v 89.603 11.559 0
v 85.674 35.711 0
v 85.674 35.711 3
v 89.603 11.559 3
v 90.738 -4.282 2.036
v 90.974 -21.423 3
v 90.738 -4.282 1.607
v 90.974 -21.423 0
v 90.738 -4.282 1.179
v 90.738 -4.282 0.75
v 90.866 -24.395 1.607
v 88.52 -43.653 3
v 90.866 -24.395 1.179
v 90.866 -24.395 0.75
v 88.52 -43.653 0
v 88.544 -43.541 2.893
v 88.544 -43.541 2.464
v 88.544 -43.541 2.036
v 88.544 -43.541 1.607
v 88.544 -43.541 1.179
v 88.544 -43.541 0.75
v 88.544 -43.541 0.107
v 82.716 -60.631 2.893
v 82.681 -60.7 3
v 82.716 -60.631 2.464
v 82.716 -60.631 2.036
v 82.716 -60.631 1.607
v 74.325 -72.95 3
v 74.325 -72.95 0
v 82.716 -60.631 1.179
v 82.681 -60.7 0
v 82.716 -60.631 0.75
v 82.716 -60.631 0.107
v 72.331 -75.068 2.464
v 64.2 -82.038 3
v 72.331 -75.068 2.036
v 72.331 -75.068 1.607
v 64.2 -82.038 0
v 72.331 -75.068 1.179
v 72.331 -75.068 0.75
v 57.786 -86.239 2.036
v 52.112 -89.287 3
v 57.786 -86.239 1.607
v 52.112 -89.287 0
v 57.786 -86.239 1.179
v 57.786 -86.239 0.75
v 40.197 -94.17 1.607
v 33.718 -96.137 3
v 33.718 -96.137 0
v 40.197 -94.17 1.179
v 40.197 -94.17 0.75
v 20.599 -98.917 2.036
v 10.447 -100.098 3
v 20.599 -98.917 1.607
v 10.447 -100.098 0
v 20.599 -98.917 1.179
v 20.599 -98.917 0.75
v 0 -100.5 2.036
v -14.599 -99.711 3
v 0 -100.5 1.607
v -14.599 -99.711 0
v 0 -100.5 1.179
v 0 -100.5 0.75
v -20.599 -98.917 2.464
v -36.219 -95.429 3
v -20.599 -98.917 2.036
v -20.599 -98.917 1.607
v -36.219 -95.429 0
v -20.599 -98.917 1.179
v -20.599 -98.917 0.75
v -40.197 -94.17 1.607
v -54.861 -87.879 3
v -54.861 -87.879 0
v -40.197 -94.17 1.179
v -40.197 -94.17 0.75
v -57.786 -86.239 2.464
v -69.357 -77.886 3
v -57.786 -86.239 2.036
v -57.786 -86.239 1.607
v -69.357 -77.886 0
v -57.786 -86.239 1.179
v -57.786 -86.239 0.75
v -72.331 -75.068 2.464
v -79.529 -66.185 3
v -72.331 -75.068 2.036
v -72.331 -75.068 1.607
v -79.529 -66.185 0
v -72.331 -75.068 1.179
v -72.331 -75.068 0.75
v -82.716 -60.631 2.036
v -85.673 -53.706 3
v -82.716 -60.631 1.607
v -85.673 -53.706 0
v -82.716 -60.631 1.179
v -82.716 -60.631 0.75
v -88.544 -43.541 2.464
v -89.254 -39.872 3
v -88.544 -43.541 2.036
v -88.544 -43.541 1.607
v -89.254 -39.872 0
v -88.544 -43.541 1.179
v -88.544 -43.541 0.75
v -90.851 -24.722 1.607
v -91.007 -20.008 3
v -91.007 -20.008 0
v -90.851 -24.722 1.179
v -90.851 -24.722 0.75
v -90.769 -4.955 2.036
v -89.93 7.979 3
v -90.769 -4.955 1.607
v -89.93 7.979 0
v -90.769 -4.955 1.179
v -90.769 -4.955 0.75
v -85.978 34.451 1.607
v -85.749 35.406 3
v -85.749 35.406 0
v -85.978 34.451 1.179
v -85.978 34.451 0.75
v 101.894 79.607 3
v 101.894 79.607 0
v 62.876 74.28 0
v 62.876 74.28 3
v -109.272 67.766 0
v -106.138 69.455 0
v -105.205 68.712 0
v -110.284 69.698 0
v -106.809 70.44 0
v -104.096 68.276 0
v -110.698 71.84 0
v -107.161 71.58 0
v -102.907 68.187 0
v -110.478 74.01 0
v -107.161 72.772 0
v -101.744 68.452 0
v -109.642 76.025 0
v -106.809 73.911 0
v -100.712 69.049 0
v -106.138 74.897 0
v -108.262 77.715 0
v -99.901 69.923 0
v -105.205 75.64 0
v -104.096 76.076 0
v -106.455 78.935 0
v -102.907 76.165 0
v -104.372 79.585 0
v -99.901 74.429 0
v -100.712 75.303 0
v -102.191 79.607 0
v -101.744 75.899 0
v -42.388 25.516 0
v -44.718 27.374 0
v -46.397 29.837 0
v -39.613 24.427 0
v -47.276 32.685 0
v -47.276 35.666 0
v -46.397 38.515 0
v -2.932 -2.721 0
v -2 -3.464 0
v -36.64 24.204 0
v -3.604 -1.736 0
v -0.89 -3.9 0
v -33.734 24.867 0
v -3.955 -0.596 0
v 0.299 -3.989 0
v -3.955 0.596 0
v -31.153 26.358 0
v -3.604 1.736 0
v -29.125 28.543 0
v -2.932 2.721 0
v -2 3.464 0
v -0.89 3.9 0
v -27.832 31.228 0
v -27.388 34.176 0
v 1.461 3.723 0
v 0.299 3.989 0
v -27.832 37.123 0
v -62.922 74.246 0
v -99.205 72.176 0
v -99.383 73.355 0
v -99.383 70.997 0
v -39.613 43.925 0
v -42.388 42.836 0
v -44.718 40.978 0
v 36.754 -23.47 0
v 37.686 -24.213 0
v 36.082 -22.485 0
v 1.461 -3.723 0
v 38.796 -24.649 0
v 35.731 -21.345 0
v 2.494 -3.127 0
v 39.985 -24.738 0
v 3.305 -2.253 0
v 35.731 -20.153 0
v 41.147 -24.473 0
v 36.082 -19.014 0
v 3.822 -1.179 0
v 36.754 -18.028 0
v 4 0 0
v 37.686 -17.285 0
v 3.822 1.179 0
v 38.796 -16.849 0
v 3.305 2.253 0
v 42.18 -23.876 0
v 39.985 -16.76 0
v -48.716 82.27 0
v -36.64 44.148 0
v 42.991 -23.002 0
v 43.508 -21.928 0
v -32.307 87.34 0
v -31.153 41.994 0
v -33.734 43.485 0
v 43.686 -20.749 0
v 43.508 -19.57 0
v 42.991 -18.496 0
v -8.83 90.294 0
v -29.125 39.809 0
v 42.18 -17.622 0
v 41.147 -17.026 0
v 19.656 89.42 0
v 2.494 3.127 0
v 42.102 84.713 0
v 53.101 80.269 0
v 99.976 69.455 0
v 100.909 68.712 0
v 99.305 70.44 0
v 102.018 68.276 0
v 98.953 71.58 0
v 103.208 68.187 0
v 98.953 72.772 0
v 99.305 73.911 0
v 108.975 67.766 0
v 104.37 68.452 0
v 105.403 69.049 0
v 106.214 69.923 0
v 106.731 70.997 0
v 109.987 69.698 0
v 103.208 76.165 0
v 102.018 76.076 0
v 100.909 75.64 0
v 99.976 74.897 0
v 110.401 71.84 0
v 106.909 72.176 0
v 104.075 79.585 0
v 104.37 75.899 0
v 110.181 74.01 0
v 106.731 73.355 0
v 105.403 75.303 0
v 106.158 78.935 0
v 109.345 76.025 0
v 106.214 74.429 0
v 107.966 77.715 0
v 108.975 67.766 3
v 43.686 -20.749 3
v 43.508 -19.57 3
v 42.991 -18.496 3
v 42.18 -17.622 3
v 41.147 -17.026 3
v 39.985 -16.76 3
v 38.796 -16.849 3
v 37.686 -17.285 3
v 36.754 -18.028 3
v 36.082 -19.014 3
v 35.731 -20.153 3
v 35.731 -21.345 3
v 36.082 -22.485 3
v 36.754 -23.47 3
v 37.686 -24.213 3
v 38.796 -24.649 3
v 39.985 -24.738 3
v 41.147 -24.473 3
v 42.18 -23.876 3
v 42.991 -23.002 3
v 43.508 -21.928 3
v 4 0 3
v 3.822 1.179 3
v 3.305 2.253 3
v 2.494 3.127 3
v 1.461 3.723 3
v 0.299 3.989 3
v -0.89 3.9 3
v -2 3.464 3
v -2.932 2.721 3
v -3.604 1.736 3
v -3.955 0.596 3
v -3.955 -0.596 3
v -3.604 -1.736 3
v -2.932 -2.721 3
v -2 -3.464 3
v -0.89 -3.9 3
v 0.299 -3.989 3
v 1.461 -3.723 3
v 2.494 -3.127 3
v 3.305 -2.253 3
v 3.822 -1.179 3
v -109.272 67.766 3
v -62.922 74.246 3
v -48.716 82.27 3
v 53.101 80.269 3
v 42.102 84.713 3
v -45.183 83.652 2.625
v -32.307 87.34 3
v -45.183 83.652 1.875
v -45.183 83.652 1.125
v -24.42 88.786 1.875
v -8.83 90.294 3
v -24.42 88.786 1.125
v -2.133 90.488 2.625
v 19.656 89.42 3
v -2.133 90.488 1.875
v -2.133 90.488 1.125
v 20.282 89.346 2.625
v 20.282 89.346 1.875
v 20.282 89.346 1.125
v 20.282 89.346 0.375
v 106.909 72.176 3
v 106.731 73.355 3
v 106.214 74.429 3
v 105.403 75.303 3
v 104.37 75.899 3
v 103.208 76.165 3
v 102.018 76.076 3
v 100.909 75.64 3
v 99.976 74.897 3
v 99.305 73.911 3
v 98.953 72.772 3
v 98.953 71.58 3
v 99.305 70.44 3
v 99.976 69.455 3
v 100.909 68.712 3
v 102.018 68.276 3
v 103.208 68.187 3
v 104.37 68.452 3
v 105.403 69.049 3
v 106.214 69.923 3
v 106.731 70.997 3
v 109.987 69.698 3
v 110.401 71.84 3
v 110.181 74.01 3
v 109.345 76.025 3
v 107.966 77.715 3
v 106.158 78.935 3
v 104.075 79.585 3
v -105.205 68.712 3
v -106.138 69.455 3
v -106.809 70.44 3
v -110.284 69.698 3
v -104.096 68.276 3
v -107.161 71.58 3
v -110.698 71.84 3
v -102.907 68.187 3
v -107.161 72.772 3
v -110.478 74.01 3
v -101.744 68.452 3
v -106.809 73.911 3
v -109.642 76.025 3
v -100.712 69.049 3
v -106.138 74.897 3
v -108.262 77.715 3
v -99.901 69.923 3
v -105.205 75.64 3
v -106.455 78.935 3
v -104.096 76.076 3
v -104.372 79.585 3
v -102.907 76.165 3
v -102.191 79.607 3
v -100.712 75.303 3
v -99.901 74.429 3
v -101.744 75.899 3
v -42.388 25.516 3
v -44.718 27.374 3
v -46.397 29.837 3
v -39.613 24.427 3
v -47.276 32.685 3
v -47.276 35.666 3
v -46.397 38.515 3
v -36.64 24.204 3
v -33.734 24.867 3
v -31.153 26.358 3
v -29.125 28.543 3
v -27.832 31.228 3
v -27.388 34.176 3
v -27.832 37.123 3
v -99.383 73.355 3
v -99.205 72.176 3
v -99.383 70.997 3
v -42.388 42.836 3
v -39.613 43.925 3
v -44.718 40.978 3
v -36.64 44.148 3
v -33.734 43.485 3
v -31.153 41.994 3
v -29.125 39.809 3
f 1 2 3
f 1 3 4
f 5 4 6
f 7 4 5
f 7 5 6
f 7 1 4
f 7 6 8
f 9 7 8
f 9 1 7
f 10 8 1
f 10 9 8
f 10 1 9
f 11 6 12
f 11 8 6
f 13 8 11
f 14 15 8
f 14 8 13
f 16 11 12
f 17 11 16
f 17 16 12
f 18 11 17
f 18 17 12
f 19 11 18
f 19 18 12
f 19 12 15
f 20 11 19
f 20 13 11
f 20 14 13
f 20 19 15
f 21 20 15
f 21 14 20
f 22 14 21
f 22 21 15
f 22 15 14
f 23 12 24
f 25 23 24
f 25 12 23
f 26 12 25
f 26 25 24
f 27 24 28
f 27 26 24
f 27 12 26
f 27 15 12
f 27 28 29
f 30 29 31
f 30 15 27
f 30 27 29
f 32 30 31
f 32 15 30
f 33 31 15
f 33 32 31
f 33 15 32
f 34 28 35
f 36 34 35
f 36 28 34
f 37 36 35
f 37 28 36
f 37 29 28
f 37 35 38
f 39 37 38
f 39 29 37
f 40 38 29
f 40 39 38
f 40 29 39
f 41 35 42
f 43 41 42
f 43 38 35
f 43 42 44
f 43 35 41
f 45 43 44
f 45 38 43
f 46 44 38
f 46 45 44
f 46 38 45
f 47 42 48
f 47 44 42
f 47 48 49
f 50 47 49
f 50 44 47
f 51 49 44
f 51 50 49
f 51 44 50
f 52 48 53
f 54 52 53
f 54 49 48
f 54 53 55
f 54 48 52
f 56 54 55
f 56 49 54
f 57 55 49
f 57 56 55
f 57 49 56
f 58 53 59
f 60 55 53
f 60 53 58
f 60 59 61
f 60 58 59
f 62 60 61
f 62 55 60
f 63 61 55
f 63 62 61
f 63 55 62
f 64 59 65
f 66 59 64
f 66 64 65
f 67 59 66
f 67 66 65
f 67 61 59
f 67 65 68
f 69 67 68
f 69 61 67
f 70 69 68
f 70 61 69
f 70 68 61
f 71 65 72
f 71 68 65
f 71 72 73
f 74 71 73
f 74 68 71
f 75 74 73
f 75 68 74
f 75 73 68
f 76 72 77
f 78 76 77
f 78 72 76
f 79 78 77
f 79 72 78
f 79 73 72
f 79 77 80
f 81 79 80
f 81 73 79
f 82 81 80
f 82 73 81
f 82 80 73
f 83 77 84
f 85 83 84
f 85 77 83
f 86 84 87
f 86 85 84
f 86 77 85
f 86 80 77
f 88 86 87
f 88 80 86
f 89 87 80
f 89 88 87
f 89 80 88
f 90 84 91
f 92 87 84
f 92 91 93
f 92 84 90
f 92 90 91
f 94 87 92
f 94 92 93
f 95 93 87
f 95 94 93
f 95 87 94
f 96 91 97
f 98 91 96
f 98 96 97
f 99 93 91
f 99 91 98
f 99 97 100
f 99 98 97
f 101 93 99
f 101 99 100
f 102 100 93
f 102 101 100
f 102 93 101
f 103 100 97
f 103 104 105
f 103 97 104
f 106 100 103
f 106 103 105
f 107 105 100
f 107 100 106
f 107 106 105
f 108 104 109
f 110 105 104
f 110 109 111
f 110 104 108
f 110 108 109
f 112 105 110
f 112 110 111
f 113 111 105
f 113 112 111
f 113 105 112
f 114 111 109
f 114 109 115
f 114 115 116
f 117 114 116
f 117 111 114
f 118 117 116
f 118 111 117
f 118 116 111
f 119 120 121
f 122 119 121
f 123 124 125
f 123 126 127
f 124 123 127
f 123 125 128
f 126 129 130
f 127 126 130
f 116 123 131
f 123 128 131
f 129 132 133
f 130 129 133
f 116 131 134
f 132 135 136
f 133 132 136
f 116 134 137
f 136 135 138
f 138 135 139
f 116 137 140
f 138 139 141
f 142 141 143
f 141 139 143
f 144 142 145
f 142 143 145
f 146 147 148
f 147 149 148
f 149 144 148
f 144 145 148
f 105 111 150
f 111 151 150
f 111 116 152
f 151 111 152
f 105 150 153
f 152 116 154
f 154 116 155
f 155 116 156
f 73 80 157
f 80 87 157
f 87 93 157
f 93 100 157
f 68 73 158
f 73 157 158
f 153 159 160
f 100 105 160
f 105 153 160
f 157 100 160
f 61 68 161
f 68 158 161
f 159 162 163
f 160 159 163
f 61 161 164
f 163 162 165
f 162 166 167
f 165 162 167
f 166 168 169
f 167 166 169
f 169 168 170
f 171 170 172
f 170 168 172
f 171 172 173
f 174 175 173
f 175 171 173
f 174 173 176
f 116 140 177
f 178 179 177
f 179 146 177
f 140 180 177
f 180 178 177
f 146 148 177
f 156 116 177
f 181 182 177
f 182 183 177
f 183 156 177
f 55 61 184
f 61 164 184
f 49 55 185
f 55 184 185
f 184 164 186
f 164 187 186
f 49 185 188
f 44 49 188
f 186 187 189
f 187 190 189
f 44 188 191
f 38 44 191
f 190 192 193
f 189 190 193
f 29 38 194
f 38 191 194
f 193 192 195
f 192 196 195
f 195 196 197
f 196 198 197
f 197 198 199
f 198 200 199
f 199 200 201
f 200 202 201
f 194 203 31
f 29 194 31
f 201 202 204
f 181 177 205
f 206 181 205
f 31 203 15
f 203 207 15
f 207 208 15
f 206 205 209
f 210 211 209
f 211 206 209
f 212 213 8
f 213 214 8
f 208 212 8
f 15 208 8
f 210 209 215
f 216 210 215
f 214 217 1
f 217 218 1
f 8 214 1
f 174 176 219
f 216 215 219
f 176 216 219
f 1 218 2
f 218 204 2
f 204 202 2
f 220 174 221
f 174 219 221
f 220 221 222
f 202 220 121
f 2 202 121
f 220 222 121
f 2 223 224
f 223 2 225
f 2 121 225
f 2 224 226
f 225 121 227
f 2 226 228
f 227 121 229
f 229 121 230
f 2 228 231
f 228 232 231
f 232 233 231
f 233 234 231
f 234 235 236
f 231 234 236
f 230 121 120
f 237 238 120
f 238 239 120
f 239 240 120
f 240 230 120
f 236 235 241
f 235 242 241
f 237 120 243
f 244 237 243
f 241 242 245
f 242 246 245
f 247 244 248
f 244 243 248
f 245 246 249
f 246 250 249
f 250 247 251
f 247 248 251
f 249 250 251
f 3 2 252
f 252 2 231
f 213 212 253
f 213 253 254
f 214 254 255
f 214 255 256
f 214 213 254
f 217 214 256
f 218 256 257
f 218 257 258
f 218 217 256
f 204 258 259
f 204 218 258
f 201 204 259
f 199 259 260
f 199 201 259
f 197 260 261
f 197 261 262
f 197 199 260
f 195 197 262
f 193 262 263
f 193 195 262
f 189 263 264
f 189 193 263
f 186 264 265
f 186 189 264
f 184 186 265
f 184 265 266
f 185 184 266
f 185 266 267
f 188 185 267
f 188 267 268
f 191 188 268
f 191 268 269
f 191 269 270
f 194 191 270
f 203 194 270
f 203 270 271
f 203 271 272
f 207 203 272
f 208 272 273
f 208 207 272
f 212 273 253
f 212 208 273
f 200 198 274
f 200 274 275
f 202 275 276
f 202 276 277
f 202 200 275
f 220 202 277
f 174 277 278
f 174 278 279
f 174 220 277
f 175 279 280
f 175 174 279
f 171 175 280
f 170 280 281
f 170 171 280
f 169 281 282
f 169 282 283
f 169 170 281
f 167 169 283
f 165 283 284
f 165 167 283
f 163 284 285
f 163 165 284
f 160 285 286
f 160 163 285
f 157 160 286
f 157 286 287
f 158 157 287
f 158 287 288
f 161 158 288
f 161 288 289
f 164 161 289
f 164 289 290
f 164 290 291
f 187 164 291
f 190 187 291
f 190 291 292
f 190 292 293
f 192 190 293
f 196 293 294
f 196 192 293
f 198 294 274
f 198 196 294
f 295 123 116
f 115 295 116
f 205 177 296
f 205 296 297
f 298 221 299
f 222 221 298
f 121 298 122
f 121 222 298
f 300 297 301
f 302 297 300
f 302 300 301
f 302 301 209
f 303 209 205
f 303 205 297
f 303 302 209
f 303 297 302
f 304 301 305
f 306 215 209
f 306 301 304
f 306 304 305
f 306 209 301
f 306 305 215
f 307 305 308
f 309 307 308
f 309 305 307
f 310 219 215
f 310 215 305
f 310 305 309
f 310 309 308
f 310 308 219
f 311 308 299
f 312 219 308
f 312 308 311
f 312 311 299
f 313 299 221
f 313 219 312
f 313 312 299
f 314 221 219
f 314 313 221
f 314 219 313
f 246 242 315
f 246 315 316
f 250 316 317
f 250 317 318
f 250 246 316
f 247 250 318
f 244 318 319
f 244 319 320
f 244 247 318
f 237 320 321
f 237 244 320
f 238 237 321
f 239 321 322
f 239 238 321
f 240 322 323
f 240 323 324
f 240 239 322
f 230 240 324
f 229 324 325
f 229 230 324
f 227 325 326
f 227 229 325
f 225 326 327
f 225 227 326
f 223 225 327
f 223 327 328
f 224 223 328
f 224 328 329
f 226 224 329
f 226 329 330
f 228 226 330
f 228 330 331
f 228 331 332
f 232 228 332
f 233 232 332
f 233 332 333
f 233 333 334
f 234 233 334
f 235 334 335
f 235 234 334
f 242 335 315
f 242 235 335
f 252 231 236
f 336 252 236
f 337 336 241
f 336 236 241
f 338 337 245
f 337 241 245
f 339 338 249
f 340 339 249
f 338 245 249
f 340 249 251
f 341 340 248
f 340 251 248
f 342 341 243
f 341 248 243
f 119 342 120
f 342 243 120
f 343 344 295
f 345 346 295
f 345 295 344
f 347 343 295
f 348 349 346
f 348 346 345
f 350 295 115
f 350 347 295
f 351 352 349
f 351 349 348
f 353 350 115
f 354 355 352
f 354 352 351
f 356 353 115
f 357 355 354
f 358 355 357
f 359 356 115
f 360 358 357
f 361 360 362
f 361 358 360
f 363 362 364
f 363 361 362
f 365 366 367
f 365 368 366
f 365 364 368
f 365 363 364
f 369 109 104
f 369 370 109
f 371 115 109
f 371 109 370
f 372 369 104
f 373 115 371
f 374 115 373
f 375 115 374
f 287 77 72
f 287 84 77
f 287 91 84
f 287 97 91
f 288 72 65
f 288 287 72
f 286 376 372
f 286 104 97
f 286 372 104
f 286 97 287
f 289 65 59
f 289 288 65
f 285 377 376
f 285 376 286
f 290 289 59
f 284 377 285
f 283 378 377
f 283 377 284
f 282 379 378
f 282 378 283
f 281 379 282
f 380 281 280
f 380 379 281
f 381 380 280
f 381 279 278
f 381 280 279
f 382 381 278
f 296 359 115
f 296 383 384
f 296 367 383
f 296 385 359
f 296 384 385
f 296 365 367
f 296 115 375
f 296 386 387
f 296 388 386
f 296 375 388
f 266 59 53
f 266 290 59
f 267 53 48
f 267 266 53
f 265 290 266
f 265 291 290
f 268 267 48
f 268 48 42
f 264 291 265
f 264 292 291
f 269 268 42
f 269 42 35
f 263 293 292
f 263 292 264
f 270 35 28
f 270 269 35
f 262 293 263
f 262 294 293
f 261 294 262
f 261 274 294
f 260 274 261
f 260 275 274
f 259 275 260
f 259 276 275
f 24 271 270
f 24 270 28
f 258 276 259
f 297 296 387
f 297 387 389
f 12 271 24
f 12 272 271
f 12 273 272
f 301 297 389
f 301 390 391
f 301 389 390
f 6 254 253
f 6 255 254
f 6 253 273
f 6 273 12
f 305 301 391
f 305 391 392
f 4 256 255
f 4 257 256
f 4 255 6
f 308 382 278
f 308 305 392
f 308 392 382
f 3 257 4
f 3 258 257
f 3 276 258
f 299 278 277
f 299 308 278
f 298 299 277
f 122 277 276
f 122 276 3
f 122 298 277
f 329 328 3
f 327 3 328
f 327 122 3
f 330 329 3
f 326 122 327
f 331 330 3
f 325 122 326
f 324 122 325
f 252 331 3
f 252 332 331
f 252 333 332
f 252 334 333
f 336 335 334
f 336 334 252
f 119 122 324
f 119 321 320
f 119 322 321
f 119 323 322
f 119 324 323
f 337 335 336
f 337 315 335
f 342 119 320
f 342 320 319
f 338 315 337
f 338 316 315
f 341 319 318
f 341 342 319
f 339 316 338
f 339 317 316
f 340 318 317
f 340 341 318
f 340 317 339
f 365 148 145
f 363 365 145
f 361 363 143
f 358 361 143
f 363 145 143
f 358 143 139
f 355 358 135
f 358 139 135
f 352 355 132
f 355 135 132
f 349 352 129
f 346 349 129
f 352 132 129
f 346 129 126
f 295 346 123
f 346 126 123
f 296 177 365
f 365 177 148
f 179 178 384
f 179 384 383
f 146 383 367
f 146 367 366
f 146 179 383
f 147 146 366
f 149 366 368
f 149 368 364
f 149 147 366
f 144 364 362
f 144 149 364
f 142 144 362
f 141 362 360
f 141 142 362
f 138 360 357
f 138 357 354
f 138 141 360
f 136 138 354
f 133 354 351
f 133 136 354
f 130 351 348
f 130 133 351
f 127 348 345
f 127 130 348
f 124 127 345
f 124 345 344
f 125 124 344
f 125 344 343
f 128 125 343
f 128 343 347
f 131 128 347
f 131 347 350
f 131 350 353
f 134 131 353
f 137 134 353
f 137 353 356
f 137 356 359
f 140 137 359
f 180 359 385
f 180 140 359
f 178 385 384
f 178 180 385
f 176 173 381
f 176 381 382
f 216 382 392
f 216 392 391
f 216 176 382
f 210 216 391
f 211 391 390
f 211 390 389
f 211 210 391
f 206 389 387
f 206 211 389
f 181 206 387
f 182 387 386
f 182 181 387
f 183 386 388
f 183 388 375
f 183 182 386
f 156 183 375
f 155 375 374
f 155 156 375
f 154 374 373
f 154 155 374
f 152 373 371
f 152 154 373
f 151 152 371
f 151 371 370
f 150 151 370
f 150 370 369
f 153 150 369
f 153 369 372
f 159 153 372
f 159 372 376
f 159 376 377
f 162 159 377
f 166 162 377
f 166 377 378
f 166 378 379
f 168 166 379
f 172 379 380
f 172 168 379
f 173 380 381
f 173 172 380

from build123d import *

# Parameters (mm, degrees)
SKETCH_2_R      = 4
SKETCH_2_R_2    = 4.000000012
SKETCH_2_R_3    = 10
EXTRUDE_2_DEPTH = 3


with BuildPart() as part:
    # 草图2 → 凸台-拉伸2 (new body)
    with BuildSketch(Plane.XY):
        with BuildLine():
            Line((-62.921735182, 74.245798648), (-102.190957478, 79.606919068))
            ThreePointArc((-102.190957478, 79.606919068), (-109.642306337, 76.02514292), (-109.271978796, 67.765931231))
            Line((-109.271978796, 67.765931231), (-85.74852731, 35.405842289))
            add(Edge.make_bspline(
                [(85.673591965, 35.711161483), (85.776981576, 35.292234587), (87.38306318, 28.632974431), (89.007173167, 18.400976728), (90.213980049, 5.05235491), (91.023425479, -8.300155004), (91.249087203, -24.88029803), (89.482806545, -40.668877417), (86.31440773, -52.443657906), (82.915098619, -60.73865793), (78.31847455, -68.385420626), (70.564310171, -77.478782389), (58.291973958, -86.77831017), (40.530617706, -94.699883912), (20.766532671, -99.44381146), (8e-09, -101.028094273), (-20.766532656, -99.44381146), (-40.530617691, -94.699883912), (-58.291973943, -86.77831017), (-70.564310156, -77.478782389), (-78.318474535, -68.385420626), (-82.915098604, -60.73865793), (-86.314407715, -52.443657906), (-89.48280653, -40.668877417), (-91.249087188, -24.88029803), (-91.023425464, -8.300155004), (-90.213980034, 5.05235491), (-89.007173152, 18.400976728), (-87.400005421, 28.526237122), (-85.826069563, 35.088143132), (-85.74852731, 35.405842289)],
                knots=[1.185395253, 1.185395253, 1.185395253, 1.185395253, 1.1875, 1.21875, 1.234375, 1.25, 1.28125, 1.3125, 1.328125, 1.34375, 1.359375, 1.375, 1.40625, 1.4375, 1.46875, 1.5, 1.53125, 1.5625, 1.59375, 1.625, 1.640625, 1.65625, 1.671875, 1.6875, 1.71875, 1.75, 1.765625, 1.78125, 1.8125, 1.814093804, 1.814093804, 1.814093804, 1.814093804], degree=3))
            Line((85.673591965, 35.711161483), (108.975098403, 67.765931229))
            ThreePointArc((108.975098403, 67.765931229), (109.345425949, 76.025142922), (101.894077084, 79.60691907))
            Line((101.894077084, 79.60691907), (62.876243855, 74.280118836))
            add(Edge.make_bspline(
                [(-62.921735182, 74.245798648), (-60.944982302, 75.738730542), (-53.853287332, 80.383898318), (-39.891400193, 86.051368752), (-20.449933028, 89.79255158), (-6.816644338, 90.499999998), (8e-09, 90.499999998), (6.816644353, 90.499999998), (20.449933043, 89.79255158), (39.891400208, 86.051368752), (53.834807053, 80.39139992), (60.912957084, 75.759697163), (62.876243855, 74.280118836)],
                knots=[0.893210136, 0.893210136, 0.893210136, 0.893210136, 0.90625, 0.9375, 0.96875, 1, 1, 1, 1.03125, 1.0625, 1.09375, 1.106689877, 1.106689877, 1.106689877, 1.106689877], degree=3))
        make_face()
        Circle(SKETCH_2_R, mode=Mode.SUBTRACT)
        with Locations((39.685870853, -20.749105073)):
            Circle(SKETCH_2_R_2, mode=Mode.SUBTRACT)
        with Locations((-103.20546325, 72.175850635)):
            Circle(SKETCH_2_R, mode=Mode.SUBTRACT)
        with Locations((102.908582862, 72.175850639)):
            Circle(SKETCH_2_R, mode=Mode.SUBTRACT)
        with Locations((-37.387532562, 34.175850637)):
            Circle(SKETCH_2_R_3, mode=Mode.SUBTRACT)
    extrude(amount=EXTRUDE_2_DEPTH)


solid = part.part
